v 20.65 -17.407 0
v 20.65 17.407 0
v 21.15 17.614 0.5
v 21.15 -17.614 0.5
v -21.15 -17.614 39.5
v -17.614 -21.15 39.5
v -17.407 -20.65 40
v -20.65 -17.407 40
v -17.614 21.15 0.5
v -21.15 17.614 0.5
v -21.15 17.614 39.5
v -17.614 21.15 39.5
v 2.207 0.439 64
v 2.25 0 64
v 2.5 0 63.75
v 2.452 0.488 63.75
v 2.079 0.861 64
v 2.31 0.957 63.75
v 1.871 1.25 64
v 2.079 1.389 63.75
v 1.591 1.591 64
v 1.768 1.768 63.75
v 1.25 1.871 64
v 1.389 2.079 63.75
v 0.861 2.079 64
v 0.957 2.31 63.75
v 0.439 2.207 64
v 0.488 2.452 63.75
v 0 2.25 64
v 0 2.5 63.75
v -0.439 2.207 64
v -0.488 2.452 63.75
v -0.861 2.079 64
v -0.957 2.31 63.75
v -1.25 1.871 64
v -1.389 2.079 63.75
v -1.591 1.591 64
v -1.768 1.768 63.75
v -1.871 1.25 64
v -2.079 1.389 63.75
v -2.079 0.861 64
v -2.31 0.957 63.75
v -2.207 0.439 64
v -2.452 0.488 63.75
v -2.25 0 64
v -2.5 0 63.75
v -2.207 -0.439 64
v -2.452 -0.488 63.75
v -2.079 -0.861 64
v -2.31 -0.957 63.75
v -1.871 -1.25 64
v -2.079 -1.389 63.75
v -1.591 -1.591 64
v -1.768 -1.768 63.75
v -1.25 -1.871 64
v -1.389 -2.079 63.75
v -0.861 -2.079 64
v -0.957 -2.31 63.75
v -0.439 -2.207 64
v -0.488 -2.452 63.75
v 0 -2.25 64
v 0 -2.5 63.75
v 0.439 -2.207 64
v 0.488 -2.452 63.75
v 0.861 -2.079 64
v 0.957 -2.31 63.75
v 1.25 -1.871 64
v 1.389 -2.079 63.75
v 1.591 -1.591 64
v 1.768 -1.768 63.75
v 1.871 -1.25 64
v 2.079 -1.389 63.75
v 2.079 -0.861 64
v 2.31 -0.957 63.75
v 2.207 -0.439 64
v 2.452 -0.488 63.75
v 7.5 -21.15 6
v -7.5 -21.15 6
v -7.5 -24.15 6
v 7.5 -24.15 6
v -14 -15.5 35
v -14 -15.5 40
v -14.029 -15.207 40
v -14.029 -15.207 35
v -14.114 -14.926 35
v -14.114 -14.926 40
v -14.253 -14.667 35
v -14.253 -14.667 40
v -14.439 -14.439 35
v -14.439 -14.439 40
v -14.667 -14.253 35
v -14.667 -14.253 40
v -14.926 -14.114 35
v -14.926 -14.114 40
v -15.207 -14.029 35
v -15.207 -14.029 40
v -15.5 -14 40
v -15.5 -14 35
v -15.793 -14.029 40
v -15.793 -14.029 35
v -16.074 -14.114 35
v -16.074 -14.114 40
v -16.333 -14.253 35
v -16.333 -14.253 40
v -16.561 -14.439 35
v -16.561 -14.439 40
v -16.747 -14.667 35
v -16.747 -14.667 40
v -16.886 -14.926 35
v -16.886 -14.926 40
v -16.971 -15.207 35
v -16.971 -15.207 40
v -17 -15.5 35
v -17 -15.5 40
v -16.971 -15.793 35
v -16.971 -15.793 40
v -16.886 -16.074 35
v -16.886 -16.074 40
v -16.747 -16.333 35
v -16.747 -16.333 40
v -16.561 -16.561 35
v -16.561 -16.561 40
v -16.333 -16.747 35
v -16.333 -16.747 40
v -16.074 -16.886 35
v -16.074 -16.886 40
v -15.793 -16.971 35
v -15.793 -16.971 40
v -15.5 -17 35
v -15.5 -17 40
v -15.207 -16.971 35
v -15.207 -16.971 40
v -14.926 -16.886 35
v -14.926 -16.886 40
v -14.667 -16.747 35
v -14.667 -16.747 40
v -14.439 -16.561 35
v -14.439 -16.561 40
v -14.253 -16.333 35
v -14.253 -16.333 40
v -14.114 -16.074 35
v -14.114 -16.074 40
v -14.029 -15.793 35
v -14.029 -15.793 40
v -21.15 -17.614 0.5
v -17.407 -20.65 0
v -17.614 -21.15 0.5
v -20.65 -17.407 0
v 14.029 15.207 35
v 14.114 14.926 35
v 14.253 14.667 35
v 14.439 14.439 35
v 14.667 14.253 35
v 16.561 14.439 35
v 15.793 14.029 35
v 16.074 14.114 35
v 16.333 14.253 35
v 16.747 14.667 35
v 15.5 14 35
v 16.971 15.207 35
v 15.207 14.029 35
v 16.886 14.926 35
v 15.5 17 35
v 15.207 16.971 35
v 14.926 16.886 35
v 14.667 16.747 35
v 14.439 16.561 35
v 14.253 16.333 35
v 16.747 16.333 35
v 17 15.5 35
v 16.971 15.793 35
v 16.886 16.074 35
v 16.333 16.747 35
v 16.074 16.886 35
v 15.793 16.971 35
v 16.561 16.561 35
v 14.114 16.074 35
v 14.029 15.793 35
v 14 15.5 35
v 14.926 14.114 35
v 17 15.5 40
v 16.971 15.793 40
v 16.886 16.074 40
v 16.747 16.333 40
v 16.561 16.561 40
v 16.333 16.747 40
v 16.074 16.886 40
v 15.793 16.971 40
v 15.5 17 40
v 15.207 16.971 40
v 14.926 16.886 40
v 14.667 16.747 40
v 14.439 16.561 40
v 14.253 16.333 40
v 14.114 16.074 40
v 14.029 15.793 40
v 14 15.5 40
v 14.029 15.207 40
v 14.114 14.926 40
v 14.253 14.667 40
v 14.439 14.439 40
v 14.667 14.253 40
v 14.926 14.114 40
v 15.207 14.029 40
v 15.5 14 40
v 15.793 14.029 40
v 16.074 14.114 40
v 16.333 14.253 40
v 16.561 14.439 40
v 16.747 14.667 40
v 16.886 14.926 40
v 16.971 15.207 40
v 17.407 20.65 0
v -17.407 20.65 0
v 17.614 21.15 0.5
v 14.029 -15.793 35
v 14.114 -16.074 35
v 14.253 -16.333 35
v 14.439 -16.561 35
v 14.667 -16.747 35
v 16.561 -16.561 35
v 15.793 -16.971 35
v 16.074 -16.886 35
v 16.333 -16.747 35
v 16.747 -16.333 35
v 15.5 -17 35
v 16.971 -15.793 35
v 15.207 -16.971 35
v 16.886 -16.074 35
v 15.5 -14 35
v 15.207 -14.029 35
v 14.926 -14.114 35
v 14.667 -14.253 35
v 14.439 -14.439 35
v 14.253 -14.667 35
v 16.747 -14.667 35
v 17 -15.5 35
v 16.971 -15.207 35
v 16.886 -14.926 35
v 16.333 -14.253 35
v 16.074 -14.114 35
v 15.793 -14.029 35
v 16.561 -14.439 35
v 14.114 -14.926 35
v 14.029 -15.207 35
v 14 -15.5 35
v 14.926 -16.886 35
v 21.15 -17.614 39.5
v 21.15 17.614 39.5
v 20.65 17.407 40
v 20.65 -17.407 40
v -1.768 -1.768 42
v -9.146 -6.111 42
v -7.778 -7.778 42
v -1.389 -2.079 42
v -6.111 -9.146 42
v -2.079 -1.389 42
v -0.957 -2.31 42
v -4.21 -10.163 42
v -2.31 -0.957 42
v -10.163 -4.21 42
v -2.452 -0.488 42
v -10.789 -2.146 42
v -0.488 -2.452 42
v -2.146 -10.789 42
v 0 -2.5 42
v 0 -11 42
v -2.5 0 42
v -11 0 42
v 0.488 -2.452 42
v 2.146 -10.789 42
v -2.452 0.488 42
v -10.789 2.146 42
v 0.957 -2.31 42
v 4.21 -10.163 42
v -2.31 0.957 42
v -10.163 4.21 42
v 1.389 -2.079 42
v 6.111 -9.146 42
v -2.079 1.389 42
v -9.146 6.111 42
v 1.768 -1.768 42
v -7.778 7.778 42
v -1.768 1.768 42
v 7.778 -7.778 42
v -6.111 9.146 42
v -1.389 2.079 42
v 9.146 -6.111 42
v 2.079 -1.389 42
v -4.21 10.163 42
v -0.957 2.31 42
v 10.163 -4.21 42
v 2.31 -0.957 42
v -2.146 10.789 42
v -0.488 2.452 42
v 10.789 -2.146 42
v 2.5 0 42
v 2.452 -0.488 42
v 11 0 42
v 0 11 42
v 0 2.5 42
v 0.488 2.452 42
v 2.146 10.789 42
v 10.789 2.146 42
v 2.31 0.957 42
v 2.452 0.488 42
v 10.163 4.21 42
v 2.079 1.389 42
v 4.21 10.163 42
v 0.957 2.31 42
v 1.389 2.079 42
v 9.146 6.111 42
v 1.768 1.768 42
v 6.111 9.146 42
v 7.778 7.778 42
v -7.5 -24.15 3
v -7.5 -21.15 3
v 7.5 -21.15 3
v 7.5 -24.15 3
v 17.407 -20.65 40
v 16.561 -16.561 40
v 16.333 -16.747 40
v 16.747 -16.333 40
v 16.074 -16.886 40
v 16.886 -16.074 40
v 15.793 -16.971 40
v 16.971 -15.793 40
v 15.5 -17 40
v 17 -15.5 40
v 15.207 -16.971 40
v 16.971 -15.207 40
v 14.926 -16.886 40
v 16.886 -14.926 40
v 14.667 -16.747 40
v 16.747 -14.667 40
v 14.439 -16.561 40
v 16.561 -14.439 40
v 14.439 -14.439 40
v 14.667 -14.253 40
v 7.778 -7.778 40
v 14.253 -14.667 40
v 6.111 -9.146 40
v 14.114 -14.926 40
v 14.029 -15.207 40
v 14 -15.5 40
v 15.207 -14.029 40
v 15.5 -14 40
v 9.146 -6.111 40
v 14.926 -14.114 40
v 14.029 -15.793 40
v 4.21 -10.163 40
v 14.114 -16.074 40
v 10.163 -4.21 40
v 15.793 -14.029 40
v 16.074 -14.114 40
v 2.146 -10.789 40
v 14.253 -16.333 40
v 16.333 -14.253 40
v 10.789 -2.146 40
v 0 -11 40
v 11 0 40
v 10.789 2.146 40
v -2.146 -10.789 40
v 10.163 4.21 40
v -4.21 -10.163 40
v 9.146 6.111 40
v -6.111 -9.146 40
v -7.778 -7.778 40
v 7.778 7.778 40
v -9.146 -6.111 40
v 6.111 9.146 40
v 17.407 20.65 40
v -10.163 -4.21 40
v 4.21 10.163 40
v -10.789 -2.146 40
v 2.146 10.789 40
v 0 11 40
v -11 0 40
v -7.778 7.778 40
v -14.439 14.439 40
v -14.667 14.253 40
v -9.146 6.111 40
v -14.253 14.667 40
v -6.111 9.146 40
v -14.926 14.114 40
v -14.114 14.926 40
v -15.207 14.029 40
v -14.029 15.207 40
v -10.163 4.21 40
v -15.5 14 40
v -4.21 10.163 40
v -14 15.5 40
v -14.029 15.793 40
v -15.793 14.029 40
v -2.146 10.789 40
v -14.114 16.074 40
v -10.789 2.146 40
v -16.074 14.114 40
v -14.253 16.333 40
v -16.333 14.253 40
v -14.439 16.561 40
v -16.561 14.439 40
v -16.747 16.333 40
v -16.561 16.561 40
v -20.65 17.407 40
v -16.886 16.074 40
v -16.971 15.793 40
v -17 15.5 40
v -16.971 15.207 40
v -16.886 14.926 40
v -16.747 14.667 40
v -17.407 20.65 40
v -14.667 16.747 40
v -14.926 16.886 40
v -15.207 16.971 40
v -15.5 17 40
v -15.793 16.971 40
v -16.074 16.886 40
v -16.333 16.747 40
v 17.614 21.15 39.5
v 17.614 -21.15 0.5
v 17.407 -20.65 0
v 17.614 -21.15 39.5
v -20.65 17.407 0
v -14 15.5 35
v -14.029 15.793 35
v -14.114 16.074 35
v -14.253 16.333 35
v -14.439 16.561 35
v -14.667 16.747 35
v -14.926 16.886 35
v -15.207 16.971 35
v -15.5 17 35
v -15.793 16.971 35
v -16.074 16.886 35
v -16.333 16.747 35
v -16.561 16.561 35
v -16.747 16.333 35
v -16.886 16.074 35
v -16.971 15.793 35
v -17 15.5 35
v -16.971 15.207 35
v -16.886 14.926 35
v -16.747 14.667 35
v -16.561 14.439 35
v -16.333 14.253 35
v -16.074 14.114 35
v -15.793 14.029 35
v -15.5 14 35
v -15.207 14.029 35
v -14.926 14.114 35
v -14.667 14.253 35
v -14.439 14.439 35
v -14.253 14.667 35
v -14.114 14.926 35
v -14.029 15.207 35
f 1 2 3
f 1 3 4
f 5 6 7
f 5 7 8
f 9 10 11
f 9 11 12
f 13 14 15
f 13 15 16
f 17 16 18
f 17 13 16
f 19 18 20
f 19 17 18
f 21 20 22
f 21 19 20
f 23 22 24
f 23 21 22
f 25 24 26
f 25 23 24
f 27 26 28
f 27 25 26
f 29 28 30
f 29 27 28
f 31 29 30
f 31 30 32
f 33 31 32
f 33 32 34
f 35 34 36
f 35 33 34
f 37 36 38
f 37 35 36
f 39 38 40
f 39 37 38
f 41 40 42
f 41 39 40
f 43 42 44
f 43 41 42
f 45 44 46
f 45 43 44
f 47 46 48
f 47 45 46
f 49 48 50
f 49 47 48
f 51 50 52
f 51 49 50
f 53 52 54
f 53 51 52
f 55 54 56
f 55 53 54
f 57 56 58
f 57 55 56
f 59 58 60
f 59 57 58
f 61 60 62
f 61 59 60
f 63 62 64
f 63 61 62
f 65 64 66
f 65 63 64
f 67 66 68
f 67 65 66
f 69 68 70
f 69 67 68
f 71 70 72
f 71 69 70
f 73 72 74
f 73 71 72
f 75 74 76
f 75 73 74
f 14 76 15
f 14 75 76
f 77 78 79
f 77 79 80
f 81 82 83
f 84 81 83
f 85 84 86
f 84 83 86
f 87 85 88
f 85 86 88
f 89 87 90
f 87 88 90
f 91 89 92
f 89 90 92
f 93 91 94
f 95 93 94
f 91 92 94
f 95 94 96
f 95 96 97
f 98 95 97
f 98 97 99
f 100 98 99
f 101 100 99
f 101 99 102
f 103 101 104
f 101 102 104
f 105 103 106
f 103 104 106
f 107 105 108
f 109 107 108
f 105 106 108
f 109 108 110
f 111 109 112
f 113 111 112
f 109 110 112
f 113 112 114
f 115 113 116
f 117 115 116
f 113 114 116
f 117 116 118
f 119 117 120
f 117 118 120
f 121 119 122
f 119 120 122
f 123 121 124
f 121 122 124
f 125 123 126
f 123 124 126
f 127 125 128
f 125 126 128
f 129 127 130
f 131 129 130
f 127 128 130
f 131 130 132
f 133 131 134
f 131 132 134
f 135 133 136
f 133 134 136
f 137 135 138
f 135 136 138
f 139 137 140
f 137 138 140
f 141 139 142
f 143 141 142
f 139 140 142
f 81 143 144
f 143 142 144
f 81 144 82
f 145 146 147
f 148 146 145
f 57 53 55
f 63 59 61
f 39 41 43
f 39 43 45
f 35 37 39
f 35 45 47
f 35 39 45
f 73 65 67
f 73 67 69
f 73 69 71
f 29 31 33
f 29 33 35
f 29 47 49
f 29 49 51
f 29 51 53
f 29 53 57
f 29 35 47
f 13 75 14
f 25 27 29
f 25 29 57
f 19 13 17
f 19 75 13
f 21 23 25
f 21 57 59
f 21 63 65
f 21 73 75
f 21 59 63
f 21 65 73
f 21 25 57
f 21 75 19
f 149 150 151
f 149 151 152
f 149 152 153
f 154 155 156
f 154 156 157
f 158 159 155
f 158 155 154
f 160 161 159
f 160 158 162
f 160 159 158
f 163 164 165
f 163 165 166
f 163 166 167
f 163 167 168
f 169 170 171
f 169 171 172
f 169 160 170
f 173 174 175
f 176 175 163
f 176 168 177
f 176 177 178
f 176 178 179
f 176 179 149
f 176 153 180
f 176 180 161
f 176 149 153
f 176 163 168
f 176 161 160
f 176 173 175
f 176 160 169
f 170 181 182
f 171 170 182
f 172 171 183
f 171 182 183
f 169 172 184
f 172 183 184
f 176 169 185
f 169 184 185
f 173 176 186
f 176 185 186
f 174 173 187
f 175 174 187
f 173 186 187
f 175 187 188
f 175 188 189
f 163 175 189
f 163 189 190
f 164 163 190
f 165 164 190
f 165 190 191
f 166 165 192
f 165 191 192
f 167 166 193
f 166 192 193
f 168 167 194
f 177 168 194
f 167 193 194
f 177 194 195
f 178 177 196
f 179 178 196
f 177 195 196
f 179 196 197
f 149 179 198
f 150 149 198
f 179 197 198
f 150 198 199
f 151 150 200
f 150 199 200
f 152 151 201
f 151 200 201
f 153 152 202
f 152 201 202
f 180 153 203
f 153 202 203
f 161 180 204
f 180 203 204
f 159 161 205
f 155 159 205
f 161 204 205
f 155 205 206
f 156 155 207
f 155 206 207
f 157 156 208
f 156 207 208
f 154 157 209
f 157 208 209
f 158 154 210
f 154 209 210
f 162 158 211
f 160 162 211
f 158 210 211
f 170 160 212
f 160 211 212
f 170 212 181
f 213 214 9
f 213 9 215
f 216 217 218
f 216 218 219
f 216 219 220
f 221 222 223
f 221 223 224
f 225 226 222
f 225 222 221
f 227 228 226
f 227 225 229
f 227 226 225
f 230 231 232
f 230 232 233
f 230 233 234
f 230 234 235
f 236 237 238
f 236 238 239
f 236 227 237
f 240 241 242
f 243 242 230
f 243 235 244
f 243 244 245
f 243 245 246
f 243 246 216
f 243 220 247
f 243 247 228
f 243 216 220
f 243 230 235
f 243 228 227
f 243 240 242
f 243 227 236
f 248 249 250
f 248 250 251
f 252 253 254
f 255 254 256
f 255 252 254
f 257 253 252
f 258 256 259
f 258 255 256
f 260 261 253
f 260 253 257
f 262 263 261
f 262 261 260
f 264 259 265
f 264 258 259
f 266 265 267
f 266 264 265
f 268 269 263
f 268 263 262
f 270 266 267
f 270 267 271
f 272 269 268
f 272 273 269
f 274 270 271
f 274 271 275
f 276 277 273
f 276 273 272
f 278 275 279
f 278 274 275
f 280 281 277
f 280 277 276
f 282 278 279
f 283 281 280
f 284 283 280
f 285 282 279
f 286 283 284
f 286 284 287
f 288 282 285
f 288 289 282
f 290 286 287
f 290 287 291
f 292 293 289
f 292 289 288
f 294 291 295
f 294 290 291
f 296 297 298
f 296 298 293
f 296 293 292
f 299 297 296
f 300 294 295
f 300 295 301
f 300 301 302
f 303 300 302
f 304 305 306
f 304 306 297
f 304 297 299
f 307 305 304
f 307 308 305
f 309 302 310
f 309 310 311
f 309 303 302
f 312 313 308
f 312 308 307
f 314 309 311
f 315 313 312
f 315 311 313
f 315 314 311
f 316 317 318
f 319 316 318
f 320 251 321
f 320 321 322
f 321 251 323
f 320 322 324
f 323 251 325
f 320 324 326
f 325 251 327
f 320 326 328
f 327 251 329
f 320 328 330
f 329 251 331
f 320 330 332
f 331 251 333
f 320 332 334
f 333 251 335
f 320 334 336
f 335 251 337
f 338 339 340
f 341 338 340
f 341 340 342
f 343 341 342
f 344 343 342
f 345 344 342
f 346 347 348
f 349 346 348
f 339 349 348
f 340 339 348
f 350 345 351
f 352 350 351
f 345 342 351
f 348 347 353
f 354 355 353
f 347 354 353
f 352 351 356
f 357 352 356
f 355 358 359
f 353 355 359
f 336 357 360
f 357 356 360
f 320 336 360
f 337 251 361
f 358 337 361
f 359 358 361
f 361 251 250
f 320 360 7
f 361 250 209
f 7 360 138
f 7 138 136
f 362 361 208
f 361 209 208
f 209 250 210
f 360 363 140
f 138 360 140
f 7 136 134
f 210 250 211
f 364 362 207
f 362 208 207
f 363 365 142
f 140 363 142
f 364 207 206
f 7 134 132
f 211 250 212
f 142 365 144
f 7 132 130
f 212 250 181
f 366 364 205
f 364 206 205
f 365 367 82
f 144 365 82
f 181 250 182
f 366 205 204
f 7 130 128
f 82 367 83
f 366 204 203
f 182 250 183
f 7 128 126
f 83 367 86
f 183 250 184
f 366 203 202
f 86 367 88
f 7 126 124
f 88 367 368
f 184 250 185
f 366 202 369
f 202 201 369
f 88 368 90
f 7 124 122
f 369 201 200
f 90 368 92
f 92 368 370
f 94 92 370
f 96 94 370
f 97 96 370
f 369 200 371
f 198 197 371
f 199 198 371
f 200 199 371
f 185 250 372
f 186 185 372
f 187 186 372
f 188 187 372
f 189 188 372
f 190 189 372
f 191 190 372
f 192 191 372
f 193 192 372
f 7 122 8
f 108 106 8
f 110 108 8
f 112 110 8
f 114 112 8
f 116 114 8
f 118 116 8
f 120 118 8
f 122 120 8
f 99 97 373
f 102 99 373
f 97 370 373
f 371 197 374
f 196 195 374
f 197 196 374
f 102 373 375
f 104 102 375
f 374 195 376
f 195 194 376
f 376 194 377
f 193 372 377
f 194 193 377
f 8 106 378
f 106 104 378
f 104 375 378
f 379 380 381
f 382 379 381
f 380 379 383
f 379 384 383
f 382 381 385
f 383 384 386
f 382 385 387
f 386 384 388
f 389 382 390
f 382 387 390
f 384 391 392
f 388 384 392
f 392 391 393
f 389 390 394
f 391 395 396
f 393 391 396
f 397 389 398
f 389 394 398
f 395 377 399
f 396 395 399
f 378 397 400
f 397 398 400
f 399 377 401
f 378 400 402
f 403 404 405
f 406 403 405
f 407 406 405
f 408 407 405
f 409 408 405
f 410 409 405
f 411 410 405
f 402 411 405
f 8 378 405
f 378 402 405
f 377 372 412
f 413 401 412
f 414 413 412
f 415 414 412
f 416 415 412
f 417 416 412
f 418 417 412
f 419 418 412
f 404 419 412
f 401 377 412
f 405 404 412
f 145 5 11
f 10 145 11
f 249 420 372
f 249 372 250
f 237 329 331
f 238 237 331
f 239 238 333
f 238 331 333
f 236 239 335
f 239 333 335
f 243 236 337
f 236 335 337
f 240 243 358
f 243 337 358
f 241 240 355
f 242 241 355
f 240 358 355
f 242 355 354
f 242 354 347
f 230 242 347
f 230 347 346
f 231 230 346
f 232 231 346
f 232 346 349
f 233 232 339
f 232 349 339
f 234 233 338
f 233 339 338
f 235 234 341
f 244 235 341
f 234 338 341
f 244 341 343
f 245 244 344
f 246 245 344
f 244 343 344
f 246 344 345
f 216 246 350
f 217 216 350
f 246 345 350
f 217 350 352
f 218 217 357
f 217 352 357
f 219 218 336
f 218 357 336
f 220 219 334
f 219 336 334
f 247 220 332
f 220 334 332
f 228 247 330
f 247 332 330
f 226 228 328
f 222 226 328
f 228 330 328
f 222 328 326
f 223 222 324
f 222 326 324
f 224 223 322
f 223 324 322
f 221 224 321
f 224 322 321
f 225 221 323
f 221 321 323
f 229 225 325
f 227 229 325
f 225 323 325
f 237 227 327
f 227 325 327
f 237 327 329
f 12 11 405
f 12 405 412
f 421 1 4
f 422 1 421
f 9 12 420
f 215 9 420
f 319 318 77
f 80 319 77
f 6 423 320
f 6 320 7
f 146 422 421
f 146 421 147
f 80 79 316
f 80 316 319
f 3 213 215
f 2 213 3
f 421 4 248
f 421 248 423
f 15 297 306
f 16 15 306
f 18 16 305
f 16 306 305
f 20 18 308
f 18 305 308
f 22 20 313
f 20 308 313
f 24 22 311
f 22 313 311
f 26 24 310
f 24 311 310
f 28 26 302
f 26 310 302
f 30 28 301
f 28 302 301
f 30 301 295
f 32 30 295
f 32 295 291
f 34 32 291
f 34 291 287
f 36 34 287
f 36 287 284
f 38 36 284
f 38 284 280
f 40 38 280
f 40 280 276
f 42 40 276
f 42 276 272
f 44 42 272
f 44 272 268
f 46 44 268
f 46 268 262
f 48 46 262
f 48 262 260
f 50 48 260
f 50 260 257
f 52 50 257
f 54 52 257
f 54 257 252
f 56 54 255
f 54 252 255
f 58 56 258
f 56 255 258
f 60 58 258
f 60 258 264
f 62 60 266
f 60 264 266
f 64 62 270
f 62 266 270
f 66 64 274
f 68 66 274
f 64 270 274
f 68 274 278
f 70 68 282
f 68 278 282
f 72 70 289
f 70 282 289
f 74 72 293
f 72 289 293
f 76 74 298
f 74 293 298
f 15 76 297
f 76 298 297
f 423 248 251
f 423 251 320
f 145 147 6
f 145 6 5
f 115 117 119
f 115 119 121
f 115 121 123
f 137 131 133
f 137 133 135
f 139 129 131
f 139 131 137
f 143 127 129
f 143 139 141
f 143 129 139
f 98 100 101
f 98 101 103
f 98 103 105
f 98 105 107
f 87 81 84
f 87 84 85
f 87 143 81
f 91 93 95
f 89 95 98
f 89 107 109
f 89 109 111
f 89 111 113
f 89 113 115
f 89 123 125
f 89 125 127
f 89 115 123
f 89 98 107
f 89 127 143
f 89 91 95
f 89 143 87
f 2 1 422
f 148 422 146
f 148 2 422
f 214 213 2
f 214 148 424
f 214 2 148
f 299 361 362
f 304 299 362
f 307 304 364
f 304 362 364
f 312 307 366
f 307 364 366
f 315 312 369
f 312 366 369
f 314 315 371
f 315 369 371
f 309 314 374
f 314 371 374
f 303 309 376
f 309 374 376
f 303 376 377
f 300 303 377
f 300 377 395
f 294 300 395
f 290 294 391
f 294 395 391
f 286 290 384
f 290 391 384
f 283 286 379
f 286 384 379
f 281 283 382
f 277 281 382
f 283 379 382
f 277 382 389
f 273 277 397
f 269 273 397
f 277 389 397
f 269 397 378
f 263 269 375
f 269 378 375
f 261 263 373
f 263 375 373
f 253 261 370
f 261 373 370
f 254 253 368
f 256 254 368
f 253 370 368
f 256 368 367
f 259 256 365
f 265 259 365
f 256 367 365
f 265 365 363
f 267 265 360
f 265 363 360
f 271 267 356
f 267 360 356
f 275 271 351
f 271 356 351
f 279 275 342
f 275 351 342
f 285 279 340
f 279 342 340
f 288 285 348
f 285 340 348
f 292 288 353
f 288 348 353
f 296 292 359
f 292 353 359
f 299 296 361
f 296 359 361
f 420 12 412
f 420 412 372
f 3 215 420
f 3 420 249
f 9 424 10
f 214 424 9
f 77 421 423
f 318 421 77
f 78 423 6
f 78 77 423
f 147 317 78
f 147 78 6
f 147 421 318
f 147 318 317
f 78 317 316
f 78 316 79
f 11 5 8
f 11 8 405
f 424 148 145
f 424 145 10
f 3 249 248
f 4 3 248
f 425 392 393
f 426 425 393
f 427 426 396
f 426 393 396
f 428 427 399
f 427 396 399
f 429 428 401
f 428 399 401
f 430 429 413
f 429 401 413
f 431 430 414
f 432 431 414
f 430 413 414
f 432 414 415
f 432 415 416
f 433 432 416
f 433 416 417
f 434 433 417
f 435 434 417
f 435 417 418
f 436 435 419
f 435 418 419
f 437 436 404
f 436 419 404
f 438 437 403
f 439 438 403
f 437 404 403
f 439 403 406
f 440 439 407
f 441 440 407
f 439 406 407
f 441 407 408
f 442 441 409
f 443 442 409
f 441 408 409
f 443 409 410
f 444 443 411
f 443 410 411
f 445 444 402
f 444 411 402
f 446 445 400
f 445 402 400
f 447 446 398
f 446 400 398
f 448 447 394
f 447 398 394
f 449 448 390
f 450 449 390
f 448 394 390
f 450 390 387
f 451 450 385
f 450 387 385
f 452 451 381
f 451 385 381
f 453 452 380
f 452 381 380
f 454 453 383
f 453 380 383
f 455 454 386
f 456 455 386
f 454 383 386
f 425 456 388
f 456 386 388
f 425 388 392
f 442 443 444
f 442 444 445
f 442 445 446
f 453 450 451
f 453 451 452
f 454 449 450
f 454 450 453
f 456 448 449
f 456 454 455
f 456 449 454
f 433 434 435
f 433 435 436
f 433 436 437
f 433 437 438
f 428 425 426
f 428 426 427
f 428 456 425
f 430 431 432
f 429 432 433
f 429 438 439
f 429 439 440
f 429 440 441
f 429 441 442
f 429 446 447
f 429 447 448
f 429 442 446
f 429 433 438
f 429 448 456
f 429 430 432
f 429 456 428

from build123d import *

# Parameters (mm, degrees)
PAD_DEPTH       = 40
SKETCH002_R     = 2.5
PAD001_DEPTH    = 24
SKETCH001_R     = 11
PAD002_DEPTH    = 2
SKETCH003_R     = 1.5
POCKET_DEPTH    = 5
CHAMFER_SIZE    = 0.5
CHAMFER001_SIZE = 0.25
SKETCH004_W     = 15
SKETCH004_H     = 3
PAD003_DEPTH    = 3


with BuildPart() as part:
    # Sketch → Pad (new body)
    with BuildSketch(Plane.XY):
        Polygon((-17.614466, 21.15), (17.614466, 21.15), (21.15, 17.614466), (21.15, -17.614466), (17.614466, -21.15), (-17.614466, -21.15), (-21.15, -17.614466), (-21.15, 17.614466), align=None)
    extrude(amount=PAD_DEPTH)

    # Sketch002 (on Face10 of Pad) → Pad001 (join)
    with BuildSketch(Plane.XY.offset(40)):
        Circle(SKETCH002_R)
    extrude(amount=PAD001_DEPTH)

    # Sketch001 (on Face10 of Pad) → Pad002 (join)
    with BuildSketch(Plane.XY.offset(40)):
        Circle(SKETCH001_R)
    extrude(amount=PAD002_DEPTH)

    # Sketch003 (on Face5 of Pad002) → Pocket (cut)
    with BuildSketch(Plane.XY.offset(40)):
        with Locations((-15.5, 15.5)):
            Circle(SKETCH003_R)
        with Locations((15.5, 15.5)):
            Circle(SKETCH003_R)
        with Locations((-15.5, -15.5)):
            Circle(SKETCH003_R)
        with Locations((15.5, -15.5)):
            Circle(SKETCH003_R)
    extrude(amount=-POCKET_DEPTH, mode=Mode.SUBTRACT)

    # Chamfer
    chamfer_edges = [part.edges().sort_by_distance(p)[0] for p in [
        (-19.382233, 19.382233, 0),
        (0, 21.15, 0),
        (19.382233, 19.382233, 0),
        (21.15, 0, 0),
        (19.382233, -19.382233, 0),
        (0, -21.15, 0),
        (-19.382233, -19.382233, 0),
        (-21.15, 0, 0),
        (0, -21.15, 40),
        (21.15, 0, 40),
        (19.382233, -19.382233, 40),
        (19.382233, 19.382233, 40),
        (0, 21.15, 40),
        (-19.382233, -19.382233, 40),
        (-21.15, 0, 40),
        (-19.382233, 19.382233, 40),
    ]]
    chamfer(chamfer_edges, length=CHAMFER_SIZE)

    # Chamfer001
    chamfer001_edges = [part.edges().sort_by_distance(p)[0] for p in [
        (-2.5, 0, 64),
    ]]
    chamfer(chamfer001_edges, length=CHAMFER001_SIZE)

    # Sketch004 (on Face19 of Chamfer001) → Pad003 (join)
    with BuildSketch(Plane.XZ.offset(21.15)):
        with Locations((0, 4.5)):
            Rectangle(SKETCH004_W, SKETCH004_H)
    extrude(amount=PAD003_DEPTH)


solid = part.part
